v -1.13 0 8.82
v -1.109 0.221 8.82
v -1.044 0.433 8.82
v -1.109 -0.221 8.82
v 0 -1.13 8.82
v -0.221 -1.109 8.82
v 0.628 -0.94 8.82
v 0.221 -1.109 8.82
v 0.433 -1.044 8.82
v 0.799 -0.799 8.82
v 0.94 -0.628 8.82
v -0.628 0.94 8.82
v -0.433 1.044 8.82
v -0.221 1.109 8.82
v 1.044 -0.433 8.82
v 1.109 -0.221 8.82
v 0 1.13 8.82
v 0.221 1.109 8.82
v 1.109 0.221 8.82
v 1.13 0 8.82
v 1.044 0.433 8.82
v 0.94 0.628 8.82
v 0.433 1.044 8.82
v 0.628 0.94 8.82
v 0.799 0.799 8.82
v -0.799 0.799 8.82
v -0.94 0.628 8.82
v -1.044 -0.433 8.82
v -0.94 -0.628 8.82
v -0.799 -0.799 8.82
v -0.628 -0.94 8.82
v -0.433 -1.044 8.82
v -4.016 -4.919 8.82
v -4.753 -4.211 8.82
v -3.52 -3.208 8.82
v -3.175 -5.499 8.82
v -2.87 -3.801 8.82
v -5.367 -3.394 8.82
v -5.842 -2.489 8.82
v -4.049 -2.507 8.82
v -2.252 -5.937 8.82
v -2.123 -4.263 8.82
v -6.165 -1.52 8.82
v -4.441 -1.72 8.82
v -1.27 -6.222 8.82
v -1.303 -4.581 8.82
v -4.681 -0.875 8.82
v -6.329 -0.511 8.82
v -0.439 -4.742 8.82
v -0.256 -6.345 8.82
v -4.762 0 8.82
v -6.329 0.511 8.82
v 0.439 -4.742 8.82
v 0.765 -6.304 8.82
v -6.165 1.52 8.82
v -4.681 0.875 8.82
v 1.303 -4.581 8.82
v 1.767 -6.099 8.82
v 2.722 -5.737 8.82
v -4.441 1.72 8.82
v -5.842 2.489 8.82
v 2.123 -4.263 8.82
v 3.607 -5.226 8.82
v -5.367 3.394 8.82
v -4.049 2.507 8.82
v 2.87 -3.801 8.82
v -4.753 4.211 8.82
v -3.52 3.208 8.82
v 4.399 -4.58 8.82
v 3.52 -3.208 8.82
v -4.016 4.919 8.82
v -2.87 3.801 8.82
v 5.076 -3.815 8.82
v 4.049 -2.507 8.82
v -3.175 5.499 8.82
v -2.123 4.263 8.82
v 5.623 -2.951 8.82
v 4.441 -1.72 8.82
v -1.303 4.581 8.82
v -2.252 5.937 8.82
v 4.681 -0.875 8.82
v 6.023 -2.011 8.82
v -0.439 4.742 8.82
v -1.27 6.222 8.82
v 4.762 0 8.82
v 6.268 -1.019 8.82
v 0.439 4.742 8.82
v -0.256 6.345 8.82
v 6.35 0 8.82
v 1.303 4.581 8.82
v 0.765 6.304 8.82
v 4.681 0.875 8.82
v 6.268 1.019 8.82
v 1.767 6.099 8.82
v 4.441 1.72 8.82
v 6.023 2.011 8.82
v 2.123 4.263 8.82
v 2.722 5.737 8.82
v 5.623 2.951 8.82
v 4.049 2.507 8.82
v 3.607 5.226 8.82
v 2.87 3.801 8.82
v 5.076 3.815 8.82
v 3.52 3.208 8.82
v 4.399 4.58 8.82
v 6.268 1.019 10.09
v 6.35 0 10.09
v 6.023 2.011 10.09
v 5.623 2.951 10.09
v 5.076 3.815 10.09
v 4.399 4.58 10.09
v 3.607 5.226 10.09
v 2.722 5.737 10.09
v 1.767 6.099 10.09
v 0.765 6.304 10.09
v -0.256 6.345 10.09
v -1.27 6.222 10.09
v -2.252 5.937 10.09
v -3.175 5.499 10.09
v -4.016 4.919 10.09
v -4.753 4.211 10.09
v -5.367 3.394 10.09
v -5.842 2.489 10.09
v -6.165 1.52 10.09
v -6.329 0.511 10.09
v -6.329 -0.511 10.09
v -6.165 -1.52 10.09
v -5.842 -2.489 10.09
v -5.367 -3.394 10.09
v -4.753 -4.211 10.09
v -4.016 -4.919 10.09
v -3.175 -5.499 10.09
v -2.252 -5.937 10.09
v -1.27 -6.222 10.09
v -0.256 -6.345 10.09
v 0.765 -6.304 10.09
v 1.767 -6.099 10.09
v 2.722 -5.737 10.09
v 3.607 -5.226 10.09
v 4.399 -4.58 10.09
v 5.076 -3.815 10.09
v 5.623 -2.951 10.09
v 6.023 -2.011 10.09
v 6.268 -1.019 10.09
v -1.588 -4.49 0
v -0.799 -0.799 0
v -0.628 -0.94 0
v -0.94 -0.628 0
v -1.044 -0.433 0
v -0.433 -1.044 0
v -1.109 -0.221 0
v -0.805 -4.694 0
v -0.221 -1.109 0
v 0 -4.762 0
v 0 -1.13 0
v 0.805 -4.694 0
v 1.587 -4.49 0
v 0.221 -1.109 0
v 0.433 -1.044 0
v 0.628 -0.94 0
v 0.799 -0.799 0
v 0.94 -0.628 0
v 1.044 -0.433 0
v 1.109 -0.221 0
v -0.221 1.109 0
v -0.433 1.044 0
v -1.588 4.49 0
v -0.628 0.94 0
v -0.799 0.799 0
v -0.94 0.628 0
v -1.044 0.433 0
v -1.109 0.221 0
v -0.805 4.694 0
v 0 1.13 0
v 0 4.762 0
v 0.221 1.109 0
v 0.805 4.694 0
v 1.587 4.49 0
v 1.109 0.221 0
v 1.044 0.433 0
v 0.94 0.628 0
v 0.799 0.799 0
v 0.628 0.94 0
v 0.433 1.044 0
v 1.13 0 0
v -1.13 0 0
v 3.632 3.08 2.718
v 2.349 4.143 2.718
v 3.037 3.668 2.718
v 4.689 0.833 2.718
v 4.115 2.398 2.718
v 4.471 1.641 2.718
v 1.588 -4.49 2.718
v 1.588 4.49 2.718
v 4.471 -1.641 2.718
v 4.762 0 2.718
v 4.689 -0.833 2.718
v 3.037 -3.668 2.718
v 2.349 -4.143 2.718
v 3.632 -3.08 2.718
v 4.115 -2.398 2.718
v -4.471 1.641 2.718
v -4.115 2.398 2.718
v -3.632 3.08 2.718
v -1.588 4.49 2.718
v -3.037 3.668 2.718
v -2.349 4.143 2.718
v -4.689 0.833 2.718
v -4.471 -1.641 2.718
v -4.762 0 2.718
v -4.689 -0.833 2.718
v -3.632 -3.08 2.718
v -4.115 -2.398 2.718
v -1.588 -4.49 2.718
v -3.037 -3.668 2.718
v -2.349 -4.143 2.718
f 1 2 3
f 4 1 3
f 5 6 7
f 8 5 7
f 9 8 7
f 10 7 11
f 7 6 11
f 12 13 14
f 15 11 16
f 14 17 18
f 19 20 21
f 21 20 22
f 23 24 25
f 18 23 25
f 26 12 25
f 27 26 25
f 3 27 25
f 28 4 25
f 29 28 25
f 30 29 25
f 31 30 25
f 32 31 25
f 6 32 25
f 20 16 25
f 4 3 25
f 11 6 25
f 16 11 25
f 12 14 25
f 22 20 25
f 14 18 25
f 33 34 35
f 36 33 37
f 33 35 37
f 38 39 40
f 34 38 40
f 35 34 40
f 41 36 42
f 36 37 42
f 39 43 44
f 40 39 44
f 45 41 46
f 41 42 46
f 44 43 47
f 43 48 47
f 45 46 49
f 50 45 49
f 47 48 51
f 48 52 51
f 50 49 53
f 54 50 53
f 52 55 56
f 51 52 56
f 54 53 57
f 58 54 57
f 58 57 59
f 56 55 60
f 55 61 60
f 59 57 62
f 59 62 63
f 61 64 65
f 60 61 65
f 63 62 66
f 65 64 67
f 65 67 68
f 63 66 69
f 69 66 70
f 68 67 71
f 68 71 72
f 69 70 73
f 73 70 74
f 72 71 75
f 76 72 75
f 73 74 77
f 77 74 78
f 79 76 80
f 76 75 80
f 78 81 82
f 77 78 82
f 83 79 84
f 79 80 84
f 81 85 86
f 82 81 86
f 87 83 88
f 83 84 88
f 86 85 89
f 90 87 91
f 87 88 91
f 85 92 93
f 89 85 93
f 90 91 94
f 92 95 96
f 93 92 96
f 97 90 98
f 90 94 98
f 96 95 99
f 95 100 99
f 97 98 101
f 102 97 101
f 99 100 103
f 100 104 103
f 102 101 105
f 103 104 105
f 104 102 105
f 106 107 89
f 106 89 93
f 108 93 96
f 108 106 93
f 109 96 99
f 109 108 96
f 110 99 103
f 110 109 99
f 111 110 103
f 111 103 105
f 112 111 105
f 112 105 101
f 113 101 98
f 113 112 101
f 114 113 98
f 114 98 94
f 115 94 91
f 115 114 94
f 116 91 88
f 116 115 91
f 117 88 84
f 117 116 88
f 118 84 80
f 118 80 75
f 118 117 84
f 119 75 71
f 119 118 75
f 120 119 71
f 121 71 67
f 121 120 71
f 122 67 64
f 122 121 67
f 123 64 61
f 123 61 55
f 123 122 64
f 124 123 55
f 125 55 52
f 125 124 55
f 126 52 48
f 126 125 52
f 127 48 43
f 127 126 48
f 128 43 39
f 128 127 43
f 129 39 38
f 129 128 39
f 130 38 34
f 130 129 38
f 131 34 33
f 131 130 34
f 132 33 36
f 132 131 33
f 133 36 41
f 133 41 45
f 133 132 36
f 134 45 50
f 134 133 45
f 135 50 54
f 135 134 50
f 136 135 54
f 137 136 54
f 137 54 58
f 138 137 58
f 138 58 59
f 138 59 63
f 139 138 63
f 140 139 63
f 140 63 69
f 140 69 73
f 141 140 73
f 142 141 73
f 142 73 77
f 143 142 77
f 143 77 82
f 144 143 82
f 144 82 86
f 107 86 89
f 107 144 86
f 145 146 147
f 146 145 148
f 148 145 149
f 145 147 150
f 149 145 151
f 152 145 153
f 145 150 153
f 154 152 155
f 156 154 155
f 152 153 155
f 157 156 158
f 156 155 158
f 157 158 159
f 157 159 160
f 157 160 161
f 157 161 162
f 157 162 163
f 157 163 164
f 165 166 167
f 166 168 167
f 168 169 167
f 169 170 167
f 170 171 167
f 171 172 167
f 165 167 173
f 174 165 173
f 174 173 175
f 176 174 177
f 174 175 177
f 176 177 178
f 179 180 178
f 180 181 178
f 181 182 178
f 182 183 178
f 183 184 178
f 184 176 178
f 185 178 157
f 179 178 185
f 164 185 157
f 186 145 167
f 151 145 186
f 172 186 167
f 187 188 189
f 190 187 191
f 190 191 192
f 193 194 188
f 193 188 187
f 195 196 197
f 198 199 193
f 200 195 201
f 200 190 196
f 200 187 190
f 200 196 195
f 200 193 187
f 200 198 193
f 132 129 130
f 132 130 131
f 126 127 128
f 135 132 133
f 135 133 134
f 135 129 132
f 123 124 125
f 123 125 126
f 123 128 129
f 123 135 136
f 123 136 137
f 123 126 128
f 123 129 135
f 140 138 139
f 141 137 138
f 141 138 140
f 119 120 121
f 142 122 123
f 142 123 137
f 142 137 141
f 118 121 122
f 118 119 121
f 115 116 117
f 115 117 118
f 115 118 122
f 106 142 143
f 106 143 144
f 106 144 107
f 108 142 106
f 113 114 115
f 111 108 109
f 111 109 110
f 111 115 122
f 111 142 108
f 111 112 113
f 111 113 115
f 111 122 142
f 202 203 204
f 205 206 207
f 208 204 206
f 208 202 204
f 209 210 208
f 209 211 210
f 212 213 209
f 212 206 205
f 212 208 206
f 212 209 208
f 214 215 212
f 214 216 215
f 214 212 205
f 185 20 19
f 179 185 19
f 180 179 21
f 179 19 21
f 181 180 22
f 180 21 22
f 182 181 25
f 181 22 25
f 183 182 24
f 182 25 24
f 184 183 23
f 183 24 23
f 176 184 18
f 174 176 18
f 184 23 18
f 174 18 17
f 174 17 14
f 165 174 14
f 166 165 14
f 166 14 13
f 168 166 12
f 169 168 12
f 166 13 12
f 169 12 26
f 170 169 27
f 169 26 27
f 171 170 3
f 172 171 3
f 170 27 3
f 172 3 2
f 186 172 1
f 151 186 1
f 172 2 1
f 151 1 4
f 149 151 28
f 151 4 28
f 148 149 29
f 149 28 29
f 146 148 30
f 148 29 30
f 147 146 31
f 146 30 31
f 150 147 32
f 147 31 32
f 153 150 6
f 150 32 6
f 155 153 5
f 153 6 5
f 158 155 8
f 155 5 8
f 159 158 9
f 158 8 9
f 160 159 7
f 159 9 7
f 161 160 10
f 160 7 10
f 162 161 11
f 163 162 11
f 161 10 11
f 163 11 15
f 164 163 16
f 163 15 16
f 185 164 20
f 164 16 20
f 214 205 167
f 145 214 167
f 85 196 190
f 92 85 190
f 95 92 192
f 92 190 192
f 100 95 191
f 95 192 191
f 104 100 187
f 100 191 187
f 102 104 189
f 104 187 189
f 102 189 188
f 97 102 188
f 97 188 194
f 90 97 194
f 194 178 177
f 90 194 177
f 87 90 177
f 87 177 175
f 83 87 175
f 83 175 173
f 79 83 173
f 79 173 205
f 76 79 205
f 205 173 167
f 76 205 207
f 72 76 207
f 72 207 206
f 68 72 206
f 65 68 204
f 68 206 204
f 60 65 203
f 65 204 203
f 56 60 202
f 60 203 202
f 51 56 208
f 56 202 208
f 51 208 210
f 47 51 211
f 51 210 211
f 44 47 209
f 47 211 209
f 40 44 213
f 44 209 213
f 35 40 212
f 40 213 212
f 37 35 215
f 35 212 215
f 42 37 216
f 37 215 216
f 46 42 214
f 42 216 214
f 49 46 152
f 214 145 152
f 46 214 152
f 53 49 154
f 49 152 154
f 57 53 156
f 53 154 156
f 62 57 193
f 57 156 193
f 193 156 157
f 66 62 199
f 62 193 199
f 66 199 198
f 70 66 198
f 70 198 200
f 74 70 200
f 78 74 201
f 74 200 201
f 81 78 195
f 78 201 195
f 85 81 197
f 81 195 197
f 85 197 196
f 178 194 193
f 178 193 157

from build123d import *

# Parameters (mm, degrees)
SKETCH1_R                 = 4.7625
BOSS_EXTRUDE1_DEPTH       = 10.09015
CUT_EXTRUDE1_DEPTH        = 13.49375
CUT_EXTRUDE1_DEPTH_BACK   = 13.49375
SKETCH2_W                 = 3.175
SKETCH2_H                 = 3.175
SKETCH2_W_2               = 0.335237521
SKETCH2_H_2               = 0.139682301
F_4_40_TAPPED_HOLE1_D     = 2.2606
F_4_40_TAPPED_HOLE1_DEPTH = 8.8646
F_4_40_TAPPED_HOLE1_TIP   = 0.679152758
SKETCH6_R                 = 6.35
BOSS_EXTRUDE2_DEPTH       = 1.27


with BuildPart() as part:
    # Sketch1 → Boss-Extrude1 (new body)
    with BuildSketch(Plane.XY):
        Circle(SKETCH1_R)
    extrude(amount=BOSS_EXTRUDE1_DEPTH)

    # Sketch2 → Cut-Extrude1 (cut, two sides: drawn at the far end of the back side and taken through both)
    with BuildSketch(Plane(origin=(0, 0, 0), x_dir=(1, 0, 0), z_dir=(0, 1, 0)).offset(-CUT_EXTRUDE1_DEPTH_BACK)):
        with Locations((-3.175, -1.1303)):
            Rectangle(SKETCH2_W, SKETCH2_H)
        with Locations((6.06221185, 0.404858795)):
            Rectangle(SKETCH2_W_2, SKETCH2_H_2)
        with Locations((3.175, -1.1303)):
            Rectangle(SKETCH2_W, SKETCH2_H)
    extrude(amount=CUT_EXTRUDE1_DEPTH + CUT_EXTRUDE1_DEPTH_BACK, mode=Mode.SUBTRACT)

    # #4-40 Tapped Hole1
    with Locations(Plane(origin=(0, 0, 0), x_dir=(-1, 0, 0), z_dir=(0, 0, -1))):
        with Locations((0, 0)):
            Hole(F_4_40_TAPPED_HOLE1_D / 2, depth=F_4_40_TAPPED_HOLE1_DEPTH)
            with Locations((0, 0, -(F_4_40_TAPPED_HOLE1_DEPTH + F_4_40_TAPPED_HOLE1_TIP / 2))):  # 118° drill point
                Cone(0, F_4_40_TAPPED_HOLE1_D / 2, F_4_40_TAPPED_HOLE1_TIP, mode=Mode.SUBTRACT)

    # Sketch6 → Boss-Extrude2 (add)
    with BuildSketch(Plane.XY.offset(10.09015)):
        Circle(SKETCH6_R)
    extrude(amount=-BOSS_EXTRUDE2_DEPTH)


solid = part.part
